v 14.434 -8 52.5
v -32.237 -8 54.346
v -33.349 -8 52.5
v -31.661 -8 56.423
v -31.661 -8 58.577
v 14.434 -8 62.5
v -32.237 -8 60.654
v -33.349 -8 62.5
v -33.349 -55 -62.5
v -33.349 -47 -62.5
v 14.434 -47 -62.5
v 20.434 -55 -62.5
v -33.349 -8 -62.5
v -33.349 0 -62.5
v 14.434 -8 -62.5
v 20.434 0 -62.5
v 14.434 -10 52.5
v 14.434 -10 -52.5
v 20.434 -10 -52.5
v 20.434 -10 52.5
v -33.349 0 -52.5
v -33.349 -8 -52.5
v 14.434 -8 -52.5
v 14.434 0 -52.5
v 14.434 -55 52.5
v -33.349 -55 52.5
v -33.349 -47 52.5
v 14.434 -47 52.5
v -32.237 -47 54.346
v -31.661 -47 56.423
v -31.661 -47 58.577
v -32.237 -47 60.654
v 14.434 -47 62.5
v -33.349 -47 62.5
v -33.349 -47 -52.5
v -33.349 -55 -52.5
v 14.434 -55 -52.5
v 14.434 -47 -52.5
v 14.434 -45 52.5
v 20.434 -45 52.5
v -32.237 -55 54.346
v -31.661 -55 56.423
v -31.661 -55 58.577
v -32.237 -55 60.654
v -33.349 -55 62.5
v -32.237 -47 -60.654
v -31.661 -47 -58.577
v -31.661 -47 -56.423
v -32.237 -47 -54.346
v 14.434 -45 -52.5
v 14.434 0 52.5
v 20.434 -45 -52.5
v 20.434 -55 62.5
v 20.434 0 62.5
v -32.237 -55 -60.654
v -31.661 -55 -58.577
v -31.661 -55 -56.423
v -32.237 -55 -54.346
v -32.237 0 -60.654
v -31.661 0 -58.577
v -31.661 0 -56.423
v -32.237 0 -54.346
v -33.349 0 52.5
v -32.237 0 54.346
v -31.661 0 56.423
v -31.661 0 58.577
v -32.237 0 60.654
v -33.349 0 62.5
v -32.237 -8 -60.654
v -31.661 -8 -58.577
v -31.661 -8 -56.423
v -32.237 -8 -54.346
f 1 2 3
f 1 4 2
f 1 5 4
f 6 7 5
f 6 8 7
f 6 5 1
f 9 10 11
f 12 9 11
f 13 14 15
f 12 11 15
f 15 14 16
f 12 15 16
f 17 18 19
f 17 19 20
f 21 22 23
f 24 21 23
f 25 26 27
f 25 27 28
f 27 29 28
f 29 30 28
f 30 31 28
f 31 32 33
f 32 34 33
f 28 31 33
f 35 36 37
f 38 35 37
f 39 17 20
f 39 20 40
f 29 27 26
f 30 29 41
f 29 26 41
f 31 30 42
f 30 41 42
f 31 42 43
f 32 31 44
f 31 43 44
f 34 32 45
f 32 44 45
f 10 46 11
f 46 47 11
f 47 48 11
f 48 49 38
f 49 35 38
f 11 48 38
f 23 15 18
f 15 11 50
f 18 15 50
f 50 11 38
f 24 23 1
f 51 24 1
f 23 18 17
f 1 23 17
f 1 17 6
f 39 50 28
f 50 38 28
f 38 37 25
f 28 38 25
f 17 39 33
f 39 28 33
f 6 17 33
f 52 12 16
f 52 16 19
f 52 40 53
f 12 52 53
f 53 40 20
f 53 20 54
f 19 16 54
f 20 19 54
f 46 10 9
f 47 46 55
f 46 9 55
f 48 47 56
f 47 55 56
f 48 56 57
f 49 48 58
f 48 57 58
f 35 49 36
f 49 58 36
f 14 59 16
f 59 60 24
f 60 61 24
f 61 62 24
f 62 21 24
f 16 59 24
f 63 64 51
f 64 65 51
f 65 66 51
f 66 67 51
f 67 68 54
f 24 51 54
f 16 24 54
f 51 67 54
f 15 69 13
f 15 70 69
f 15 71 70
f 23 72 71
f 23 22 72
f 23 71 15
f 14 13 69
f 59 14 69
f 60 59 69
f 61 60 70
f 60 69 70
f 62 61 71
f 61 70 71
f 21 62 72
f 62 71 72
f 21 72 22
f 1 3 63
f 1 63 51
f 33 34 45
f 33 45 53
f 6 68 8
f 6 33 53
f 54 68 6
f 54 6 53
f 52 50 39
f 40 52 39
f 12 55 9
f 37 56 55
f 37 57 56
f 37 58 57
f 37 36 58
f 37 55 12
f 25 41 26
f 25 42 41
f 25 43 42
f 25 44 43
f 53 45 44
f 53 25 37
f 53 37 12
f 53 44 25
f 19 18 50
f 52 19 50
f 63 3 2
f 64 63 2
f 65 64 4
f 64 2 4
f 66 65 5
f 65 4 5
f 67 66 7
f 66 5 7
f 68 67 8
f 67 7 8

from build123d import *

# Parameters (mm, degrees)
F0_W     = 60
F0_H     = 125
F1_DEPTH = 55
F2_W     = 54
F2_H     = 105
F3_DEPTH = 55.001
F4_R     = 7.978421
F5_DEPTH = 55.001
F6_W     = 47.78267
F6_H     = 39
F7_DEPTH = 125.001
F8_W     = 35
F8_H     = 105
F9_DEPTH = 6.001


with BuildPart() as f1:
    # F0 (on Front) → F1 (new body)
    with BuildSketch(Plane.XZ):
        with Locations((-9.565847, 0)):
            Rectangle(F0_W, F0_H)
    extrude(amount=F1_DEPTH)

    # F2 (on face) → F3 (cut, through all)
    with BuildSketch(Plane.XZ.offset(55)):
        with Locations((-12.565847, 0)):
            Rectangle(F2_W, F2_H)
    extrude(amount=-F3_DEPTH, mode=Mode.SUBTRACT)

    # F4 (on face) → F5 (cut, through all)
    with BuildSketch(Plane.XZ.offset(55)):
        with Locations((-39.565847, 57.5)):
            Circle(F4_R)
        with Locations((-39.565847, -57.5)):
            Circle(F4_R)
    extrude(amount=-F5_DEPTH, mode=Mode.SUBTRACT)

    # F6 (on face) → F7 (cut, through all)
    with BuildSketch(Plane.XY.offset(62.5)):
        with Locations((-9.457182, -27.5)):
            Rectangle(F6_W, F6_H)
    extrude(amount=-F7_DEPTH, mode=Mode.SUBTRACT)

    # F8 (on face) → F9 (cut, through all)
    with BuildSketch(Plane(origin=(14.434153, 0, 0), x_dir=(0, -1, 0), z_dir=(-1, 0, 0))):
        with Locations((27.5, 0)):
            Rectangle(F8_W, F8_H)
    extrude(amount=-F9_DEPTH, mode=Mode.SUBTRACT)


solid = f1.part
